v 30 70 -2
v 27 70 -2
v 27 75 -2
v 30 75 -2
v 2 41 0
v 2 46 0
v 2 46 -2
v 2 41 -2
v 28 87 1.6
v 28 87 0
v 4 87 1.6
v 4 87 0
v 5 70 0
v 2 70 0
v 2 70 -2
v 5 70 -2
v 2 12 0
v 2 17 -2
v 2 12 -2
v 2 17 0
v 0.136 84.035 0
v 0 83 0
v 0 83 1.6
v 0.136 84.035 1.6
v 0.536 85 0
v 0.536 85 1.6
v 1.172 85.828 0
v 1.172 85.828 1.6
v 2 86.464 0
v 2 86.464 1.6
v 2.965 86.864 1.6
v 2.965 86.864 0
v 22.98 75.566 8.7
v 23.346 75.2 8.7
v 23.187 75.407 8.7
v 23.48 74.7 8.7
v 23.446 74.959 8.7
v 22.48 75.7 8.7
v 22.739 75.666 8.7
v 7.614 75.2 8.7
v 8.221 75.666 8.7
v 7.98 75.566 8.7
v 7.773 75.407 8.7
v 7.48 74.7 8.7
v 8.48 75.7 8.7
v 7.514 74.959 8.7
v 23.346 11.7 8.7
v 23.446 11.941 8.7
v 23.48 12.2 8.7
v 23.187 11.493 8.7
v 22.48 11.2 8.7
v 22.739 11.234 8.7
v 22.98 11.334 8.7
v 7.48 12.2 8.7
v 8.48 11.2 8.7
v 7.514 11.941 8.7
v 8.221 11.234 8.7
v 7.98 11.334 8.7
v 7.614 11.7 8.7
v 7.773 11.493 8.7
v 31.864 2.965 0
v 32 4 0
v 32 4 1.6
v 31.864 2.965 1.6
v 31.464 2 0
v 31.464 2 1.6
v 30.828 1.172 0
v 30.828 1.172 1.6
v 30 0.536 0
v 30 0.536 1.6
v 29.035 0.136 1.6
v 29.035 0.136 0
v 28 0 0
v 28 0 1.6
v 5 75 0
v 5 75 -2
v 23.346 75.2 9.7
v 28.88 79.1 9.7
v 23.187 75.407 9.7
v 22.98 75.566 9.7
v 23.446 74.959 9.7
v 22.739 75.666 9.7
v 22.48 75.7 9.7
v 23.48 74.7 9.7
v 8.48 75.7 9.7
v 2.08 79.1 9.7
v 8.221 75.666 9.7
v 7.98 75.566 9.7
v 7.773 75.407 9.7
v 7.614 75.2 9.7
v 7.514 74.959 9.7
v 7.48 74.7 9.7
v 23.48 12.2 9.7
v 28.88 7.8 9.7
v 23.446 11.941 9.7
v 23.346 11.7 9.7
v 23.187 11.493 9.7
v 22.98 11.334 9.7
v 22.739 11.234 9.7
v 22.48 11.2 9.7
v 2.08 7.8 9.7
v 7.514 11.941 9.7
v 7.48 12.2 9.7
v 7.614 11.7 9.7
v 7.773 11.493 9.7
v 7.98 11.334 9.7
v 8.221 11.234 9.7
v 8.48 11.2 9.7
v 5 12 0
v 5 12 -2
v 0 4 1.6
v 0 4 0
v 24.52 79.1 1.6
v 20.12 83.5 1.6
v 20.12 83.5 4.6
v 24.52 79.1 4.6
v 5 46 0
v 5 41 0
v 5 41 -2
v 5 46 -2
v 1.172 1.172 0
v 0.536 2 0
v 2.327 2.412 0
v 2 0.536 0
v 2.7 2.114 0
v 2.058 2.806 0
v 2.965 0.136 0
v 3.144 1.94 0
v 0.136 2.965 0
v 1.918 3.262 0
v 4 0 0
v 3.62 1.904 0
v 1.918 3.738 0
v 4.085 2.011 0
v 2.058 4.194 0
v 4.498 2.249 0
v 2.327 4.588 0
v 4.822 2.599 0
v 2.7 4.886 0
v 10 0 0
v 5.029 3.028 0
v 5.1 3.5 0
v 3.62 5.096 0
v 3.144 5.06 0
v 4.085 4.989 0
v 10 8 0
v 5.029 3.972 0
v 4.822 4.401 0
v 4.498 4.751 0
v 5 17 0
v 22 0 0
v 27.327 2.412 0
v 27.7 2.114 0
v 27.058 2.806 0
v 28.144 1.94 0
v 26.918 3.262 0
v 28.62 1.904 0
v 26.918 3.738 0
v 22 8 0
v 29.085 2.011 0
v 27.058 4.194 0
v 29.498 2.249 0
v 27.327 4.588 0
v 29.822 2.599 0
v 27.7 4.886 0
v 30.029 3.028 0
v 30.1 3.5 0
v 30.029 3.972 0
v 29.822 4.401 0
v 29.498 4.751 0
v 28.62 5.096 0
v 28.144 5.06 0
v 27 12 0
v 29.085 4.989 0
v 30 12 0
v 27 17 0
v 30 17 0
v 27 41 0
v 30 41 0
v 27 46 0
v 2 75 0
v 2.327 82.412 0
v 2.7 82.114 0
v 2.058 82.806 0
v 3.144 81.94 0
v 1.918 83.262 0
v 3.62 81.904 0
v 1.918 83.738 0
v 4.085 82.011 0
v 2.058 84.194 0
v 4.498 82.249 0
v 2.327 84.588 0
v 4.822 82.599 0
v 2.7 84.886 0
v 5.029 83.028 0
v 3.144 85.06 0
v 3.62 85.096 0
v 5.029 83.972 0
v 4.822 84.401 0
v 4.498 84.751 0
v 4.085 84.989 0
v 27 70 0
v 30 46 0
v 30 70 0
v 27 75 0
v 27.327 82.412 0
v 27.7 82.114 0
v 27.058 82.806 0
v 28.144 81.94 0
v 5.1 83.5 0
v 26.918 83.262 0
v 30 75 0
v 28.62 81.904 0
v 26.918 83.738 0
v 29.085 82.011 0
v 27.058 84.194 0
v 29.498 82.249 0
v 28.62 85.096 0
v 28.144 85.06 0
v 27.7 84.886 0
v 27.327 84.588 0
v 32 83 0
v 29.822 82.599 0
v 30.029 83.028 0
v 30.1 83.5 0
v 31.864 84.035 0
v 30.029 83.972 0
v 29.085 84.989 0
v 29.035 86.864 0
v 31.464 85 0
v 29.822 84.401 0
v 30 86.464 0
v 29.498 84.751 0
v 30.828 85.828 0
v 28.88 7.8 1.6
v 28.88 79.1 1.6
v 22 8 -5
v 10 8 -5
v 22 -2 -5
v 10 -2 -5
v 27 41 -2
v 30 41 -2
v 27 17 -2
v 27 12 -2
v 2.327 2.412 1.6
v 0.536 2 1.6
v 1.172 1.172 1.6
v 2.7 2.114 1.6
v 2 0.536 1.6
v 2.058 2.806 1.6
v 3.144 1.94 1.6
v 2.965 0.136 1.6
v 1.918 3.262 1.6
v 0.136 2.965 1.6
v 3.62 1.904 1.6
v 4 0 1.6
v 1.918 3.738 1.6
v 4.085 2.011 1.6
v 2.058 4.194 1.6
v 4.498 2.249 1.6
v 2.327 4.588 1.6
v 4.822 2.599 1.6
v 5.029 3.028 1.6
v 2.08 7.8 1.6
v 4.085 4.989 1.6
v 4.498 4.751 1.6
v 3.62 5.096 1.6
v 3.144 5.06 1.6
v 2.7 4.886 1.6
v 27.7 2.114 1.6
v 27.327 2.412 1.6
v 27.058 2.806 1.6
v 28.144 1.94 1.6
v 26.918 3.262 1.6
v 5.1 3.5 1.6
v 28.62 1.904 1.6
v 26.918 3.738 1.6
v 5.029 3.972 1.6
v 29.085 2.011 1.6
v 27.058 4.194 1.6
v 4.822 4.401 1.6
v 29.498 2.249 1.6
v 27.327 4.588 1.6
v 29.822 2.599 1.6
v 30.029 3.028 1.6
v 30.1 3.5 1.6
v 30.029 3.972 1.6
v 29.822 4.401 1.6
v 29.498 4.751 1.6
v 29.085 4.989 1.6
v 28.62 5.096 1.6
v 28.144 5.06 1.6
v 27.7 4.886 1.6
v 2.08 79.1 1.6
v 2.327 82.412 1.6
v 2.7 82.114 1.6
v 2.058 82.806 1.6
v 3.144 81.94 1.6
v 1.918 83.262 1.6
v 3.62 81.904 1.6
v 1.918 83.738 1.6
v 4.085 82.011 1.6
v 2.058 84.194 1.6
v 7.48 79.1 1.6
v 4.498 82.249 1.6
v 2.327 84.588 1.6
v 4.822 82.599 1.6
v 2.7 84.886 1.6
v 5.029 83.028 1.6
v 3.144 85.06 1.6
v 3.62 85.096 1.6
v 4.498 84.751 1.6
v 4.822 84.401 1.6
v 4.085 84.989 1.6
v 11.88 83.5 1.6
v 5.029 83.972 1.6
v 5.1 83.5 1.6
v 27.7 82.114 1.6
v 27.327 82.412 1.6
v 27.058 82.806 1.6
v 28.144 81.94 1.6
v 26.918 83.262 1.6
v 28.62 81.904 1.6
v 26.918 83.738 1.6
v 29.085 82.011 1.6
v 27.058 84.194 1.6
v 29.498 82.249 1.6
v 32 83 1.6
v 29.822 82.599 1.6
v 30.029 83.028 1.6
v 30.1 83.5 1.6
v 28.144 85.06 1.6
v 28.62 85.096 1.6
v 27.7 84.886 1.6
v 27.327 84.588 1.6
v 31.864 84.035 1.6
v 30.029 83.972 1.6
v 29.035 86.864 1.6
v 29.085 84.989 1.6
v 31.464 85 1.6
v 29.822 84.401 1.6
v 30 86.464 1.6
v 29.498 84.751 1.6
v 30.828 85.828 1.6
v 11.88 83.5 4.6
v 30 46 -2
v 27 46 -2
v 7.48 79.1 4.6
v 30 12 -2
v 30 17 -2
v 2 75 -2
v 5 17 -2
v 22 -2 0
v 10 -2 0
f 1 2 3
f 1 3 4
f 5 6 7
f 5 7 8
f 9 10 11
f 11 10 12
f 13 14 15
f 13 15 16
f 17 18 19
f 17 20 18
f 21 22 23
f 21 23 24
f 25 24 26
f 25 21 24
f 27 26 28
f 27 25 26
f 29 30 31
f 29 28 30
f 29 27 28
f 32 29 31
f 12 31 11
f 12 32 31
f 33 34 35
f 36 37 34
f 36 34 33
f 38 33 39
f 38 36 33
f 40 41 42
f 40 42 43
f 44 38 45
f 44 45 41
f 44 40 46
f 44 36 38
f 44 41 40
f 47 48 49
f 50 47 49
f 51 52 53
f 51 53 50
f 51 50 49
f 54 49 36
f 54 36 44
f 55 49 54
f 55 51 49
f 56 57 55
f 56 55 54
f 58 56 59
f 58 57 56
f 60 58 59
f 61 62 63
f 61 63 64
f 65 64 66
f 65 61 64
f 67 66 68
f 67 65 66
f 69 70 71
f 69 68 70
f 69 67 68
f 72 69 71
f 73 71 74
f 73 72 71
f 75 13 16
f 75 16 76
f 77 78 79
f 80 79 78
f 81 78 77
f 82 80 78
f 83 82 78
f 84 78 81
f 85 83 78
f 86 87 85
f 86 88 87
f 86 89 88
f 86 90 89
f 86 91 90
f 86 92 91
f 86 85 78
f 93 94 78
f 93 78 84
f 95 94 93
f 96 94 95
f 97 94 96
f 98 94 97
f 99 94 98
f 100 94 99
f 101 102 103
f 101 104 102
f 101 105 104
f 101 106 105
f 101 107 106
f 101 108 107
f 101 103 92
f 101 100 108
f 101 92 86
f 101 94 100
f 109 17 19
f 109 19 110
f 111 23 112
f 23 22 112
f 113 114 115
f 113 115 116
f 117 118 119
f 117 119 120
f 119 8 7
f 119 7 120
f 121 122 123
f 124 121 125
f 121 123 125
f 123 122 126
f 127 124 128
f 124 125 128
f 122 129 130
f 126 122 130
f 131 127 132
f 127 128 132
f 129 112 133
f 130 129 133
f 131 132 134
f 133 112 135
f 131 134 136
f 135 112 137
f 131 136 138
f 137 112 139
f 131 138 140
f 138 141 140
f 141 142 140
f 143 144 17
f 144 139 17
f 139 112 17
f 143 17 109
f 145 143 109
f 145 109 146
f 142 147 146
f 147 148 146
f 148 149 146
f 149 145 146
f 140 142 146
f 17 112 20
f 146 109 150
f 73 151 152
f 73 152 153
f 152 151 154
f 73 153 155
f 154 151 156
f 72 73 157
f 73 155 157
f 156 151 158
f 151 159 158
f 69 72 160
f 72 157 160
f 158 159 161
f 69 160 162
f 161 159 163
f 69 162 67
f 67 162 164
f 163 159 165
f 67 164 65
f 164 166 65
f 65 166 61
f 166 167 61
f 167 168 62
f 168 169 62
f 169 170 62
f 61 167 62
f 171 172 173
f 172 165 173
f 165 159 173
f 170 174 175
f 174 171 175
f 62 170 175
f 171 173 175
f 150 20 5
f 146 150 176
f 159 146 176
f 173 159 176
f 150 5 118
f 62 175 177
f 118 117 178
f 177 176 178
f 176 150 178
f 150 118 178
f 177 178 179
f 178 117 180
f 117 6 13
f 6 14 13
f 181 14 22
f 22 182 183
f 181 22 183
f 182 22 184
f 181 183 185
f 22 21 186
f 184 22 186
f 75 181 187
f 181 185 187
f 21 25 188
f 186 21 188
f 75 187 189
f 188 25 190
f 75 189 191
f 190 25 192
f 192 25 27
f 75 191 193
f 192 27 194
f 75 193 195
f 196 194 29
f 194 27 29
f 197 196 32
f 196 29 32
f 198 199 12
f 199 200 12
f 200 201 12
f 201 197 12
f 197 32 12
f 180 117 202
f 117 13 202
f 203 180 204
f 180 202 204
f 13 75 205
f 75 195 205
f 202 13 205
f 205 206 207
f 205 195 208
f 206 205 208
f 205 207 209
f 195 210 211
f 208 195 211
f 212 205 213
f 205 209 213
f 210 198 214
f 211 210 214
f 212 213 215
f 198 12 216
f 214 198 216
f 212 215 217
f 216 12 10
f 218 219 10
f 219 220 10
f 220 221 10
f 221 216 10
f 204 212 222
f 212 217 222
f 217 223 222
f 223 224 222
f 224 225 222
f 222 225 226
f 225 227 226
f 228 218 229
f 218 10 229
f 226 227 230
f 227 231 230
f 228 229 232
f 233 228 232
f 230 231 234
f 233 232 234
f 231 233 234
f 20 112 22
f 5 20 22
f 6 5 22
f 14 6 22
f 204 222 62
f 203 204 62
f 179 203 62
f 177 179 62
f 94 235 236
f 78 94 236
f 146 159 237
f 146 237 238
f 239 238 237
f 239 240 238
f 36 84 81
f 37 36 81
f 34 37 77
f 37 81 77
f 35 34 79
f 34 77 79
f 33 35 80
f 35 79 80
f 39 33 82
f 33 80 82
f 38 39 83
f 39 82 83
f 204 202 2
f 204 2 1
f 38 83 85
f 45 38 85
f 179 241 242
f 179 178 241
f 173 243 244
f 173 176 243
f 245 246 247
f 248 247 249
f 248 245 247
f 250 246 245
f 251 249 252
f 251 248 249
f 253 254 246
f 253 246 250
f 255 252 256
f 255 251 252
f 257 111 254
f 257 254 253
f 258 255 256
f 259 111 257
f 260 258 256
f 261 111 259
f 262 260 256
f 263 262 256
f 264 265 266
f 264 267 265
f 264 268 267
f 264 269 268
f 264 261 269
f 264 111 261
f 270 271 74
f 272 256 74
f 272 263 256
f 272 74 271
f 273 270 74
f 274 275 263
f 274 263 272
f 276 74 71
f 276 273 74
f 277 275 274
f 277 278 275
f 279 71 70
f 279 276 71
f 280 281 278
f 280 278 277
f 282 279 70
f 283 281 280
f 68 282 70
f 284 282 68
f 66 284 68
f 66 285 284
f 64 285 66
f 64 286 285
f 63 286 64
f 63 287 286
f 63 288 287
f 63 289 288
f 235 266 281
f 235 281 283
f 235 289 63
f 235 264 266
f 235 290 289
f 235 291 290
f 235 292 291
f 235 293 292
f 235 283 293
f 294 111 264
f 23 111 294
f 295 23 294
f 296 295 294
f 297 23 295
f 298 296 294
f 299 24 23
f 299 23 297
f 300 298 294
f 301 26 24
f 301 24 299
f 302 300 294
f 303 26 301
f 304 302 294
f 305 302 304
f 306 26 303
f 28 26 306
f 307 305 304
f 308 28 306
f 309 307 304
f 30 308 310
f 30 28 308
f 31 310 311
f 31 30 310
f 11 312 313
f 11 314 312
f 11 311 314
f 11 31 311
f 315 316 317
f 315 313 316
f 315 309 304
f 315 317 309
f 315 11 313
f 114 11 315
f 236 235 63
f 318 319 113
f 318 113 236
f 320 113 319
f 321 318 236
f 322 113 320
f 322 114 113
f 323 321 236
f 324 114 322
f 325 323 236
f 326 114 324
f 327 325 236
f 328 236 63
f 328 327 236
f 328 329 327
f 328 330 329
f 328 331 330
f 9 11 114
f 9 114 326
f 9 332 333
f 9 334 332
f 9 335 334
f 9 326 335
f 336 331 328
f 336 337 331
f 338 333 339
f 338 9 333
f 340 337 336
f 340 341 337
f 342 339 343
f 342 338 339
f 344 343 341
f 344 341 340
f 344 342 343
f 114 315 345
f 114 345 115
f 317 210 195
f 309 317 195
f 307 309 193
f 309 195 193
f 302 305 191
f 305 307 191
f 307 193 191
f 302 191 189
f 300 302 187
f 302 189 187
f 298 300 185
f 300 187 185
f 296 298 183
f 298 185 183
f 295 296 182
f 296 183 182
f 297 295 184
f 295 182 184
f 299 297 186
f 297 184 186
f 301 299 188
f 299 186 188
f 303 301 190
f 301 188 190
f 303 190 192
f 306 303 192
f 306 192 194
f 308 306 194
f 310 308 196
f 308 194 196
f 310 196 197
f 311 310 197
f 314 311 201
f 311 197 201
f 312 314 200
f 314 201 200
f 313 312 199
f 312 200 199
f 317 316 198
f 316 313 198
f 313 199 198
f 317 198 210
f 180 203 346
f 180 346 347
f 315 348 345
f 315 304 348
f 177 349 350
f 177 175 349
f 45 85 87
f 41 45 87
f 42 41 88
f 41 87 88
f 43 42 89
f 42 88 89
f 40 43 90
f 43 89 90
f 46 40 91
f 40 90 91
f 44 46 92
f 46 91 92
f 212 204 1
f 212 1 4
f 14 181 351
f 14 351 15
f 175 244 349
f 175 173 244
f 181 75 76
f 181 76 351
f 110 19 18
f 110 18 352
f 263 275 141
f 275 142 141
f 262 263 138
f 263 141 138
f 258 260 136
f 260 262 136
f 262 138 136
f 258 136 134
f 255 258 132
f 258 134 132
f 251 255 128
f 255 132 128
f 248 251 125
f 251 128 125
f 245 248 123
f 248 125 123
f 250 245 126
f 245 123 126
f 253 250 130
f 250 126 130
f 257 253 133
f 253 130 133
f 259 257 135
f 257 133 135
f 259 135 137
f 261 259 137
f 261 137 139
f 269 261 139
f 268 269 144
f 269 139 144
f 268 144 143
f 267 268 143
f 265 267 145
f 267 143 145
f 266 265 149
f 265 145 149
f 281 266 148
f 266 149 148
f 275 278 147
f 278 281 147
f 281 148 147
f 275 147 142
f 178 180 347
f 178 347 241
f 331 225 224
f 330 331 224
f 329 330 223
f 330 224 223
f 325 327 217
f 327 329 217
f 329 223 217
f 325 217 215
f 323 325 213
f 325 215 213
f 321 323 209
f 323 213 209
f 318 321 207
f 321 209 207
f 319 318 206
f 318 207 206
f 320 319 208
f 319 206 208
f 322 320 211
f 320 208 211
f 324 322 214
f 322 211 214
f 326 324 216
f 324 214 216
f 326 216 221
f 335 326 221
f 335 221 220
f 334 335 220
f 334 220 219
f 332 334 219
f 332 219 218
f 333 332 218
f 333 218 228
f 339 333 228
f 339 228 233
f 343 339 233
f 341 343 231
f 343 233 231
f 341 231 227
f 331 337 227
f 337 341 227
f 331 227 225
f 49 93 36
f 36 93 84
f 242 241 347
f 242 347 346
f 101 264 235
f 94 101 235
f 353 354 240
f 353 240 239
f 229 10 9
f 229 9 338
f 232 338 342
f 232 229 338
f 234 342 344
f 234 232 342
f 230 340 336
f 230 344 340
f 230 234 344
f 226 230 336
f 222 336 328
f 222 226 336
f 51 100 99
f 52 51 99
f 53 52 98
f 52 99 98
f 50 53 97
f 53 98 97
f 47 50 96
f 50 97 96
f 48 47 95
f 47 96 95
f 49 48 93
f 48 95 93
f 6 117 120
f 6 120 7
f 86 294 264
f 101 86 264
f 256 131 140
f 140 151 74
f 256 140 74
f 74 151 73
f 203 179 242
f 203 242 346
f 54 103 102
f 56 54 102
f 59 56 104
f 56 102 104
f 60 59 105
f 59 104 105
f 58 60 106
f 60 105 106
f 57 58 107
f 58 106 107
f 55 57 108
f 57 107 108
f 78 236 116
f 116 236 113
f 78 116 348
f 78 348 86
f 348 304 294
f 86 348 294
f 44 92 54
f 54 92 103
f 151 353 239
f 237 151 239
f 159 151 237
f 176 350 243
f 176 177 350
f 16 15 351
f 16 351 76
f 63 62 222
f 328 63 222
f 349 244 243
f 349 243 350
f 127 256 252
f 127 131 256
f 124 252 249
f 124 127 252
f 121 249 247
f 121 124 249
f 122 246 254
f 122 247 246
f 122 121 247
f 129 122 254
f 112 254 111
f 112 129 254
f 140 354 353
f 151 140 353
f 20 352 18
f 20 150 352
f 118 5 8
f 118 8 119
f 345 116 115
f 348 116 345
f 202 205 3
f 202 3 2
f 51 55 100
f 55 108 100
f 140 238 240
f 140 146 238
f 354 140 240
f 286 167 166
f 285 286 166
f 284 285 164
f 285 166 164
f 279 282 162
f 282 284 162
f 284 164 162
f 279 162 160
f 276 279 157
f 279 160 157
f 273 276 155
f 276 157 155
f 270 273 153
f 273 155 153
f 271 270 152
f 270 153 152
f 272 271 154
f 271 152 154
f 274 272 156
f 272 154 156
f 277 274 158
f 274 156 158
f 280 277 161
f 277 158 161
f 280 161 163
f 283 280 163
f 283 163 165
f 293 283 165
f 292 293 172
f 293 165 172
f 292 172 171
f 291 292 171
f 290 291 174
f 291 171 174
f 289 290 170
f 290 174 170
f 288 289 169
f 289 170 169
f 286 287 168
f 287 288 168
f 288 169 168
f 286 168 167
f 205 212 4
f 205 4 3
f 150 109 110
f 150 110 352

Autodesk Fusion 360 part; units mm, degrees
sketch "Skizze1" plane through (0, 0, 0) normal (0, 0, 1) x (1, 0, 0)
  line L0 (4, 0) -> (28, 0)
  line L1 (32, 4) -> (32, 83)
  line L2 (28, 87) -> (4, 87)
  line L3 (0, 83) -> (0, 4)
  circle A0 centre (3.5, 3.5) radius 1.6
  circle A1 centre (28.5, 3.5) radius 1.6
  circle A2 centre (3.5, 83.5) radius 1.6
  circle A3 centre (28.5, 83.5) radius 1.6
  arc A4 (4, 87) -> (0, 83) centre (4, 83) ccw
  arc A5 (32, 83) -> (28, 87) centre (28, 83) ccw
  arc A6 (0, 4) -> (4, 0) centre (4, 4) ccw
  arc A7 (28, 0) -> (32, 4) centre (28, 4) ccw
  point P0 (32, 0)
  point P1 (0, 87)
  dimension "d1" = 32
  dimension "d2" = 87
  dimension "d3" = 3.2
  dimension "d4" = 3.5
  dimension "d5" = 3.5
  dimension "d8" = 25
  dimension "d9" = 80
  dimension "d10" = 4
extrude "Extrusion1" add sketch "Skizze1" along normal blind 1.6
sketch "Skizze2" plane through (0, 0, 1.6) normal (0, 0, 1) x (-1, 0, 0)
  circle A0 centre (-28.5, -3.5) radius 1.6
  circle A1 centre (-3.5, -3.5) radius 1.6
  circle A2 centre (-3.5, -83.5) radius 1.6
  circle A3 centre (-28.5, -83.5) radius 1.6
  arc A4 (-28, 0) -> (-32, -4) centre (-28, -4) ccw
  line L0 (-32, -4) -> (-32, -83)
  arc A5 (-32, -83) -> (-28, -87) centre (-28, -83) ccw
  line L1 (-28, -87) -> (-4, -87)
  arc A6 (-4, -87) -> (0, -83) centre (-4, -83) ccw
  line L2 (0, -83) -> (0, -4)
  arc A7 (0, -4) -> (-4, 0) centre (-4, -4) ccw
  line L3 (-4, 0) -> (-28, 0)
  line L4 (-2.08, -7.8) -> (-28.88, -7.8)
  line L5 (-28.88, -7.8) -> (-28.88, -79.1)
  line L6 (-28.88, -79.1) -> (-2.08, -79.1)
  line L7 (-2.08, -79.1) -> (-2.08, -7.8)
  dimension "d13" = 26.8
  dimension "d14" = 71.3
  dimension "d15" = 7.8
  dimension "d16" = 2.08
extrude "Extrusion2" add sketch "Skizze2" along normal blind 8.1 contours L4 L5 L6 L7
sketch "Skizze3" plane through (0, 0, 9.7) normal (0, 0, 1) x (-1, 0, 0)
  line L0 (-2.08, -79.1) -> (-2.08, -7.8)
  line L1 (-2.08, -7.8) -> (-28.88, -7.8)
  line L2 (-28.88, -7.8) -> (-28.88, -79.1)
  line L3 (-28.88, -79.1) -> (-2.08, -79.1)
  line L4 (-8.48, -11.2) -> (-22.48, -11.2)
  line L5 (-23.48, -12.2) -> (-23.48, -74.7)
  line L6 (-22.48, -75.7) -> (-8.48, -75.7)
  line L7 (-7.48, -74.7) -> (-7.48, -12.2)
  arc A0 (-7.48, -12.2) -> (-8.48, -11.2) centre (-8.48, -12.2) ccw
  arc A1 (-22.48, -11.2) -> (-23.48, -12.2) centre (-22.48, -12.2) ccw
  arc A2 (-8.48, -75.7) -> (-7.48, -74.7) centre (-8.48, -74.7) ccw
  arc A3 (-23.48, -74.7) -> (-22.48, -75.7) centre (-22.48, -74.7) ccw
  point P0 (-7.48, -11.2)
  point P1 (-23.48, -11.2)
  point P2 (-7.48, -75.7)
  dimension "d19" = 16
  dimension "d20" = 64.5
  dimension "d21" = 3.4
  dimension "d22" = 5.4
  dimension "d23" = 1
extrude "Extrusion3" cut sketch "Skizze3" against normal blind 1 contours L4 L5 L6 L7 A0 A1 A2 A3
sketch "Skizze4" plane through (0, 0, 1.6) normal (0, 0, 1) x (-1, 0, 0)
  line L0 (-2.08, -79.1) -> (-28.88, -79.1)
  line L1 (-28.88, -79.1) -> (-28.88, -7.8)
  line L2 (-28.88, -7.8) -> (-2.08, -7.8)
  line L3 (-2.08, -7.8) -> (-2.08, -79.1)
  circle A0 centre (-28.5, -3.5) radius 1.6
  circle A1 centre (-3.5, -3.5) radius 1.6
  circle A2 centre (-3.5, -83.5) radius 1.6
  circle A3 centre (-28.5, -83.5) radius 1.6
  arc A4 (-28, 0) -> (-32, -4) centre (-28, -4) ccw
  line L4 (-32, -4) -> (-32, -83)
  arc A5 (-32, -83) -> (-28, -87) centre (-28, -83) ccw
  line L5 (-28, -87) -> (-4, -87)
  arc A6 (-4, -87) -> (0, -83) centre (-4, -83) ccw
  line L6 (0, -83) -> (0, -4)
  arc A7 (0, -4) -> (-4, 0) centre (-4, -4) ccw
  line L7 (-4, 0) -> (-28, 0)
  line L8 (-7.48, -79.1) -> (-11.88, -83.5)
  line L9 (-11.88, -83.5) -> (-20.12, -83.5)
  line L10 (-20.12, -83.5) -> (-24.52, -79.1)
  dimension "d26" = 7.48
  dimension "d27" = 7.48
  dimension "d28" = 3.5
  dimension "d29" = 45
  dimension "d30" = 45
extrude "Extrusion4" add sketch "Skizze4" along normal blind 3 contours L0 L8 L9 L10
sketch "Skizze5" plane through (0, 0, 0) normal (0, 0, -1) x (1, 0, 0)
  circle A0 centre (28.5, -3.5) radius 1.6
  circle A1 centre (3.5, -3.5) radius 1.6
  circle A2 centre (3.5, -83.5) radius 1.6
  circle A3 centre (28.5, -83.5) radius 1.6
  arc A4 (32, -4) -> (28, 0) centre (28, -4) ccw
  line L0 (28, 0) -> (4, 0)
  arc A5 (4, 0) -> (0, -4) centre (4, -4) ccw
  line L1 (0, -4) -> (0, -83)
  arc A6 (0, -83) -> (4, -87) centre (4, -83) ccw
  line L2 (4, -87) -> (28, -87)
  arc A7 (28, -87) -> (32, -83) centre (28, -83) ccw
  line L3 (32, -83) -> (32, -4)
  line L4 (2, -12) -> (5, -12)
  line L5 (5, -12) -> (5, -17)
  line L6 (5, -17) -> (2, -17)
  line L7 (2, -17) -> (2, -12)
  line L8 (30, -12) -> (30, -17)
  line L9 (30, -17) -> (27, -17)
  line L10 (27, -12) -> (30, -12)
  line L11 (27, -17) -> (27, -12)
  line L12 (5, -41) -> (5, -46)
  line L13 (5, -46) -> (2, -46)
  line L14 (2, -41) -> (5, -41)
  line L15 (2, -46) -> (2, -41)
  line L16 (30, -41) -> (30, -46)
  line L17 (30, -46) -> (27, -46)
  line L18 (27, -41) -> (30, -41)
  line L19 (27, -46) -> (27, -41)
  line L20 (5, -70) -> (5, -75)
  line L21 (5, -75) -> (2, -75)
  line L22 (2, -70) -> (5, -70)
  line L23 (2, -75) -> (2, -70)
  line L24 (30, -70) -> (30, -75)
  line L25 (30, -75) -> (27, -75)
  line L26 (27, -70) -> (30, -70)
  line L27 (27, -75) -> (27, -70)
  dimension "d33" = 3
  dimension "d34" = 5
  dimension "d35" = 12
  dimension "d36" = 2
  dimension "d39" = 25
  dimension "d40" = -58
extrude "Extrusion5" add sketch "Skizze5" along normal blind 2 contours L4 L5 L6 L7 | L8 L9 L10 L11 | L12 L13 L14 L15 | L16 L17 L18 L19 | L20 L21 L22 L23 | L24 L25 L26 L27
sketch "Skizze6" plane through (0, 0, 0) normal (0, 0, -1) x (1, 0, 0)
  line L0 (2, -17) -> (2, -12)
  line L1 (2, -12) -> (5, -12)
  line L2 (5, -12) -> (5, -17)
  line L3 (5, -17) -> (2, -17)
  line L4 (2, -75) -> (2, -70)
  line L5 (2, -70) -> (5, -70)
  line L6 (5, -70) -> (5, -75)
  line L7 (5, -75) -> (2, -75)
  line L8 (2, -46) -> (2, -41)
  line L9 (2, -41) -> (5, -41)
  line L10 (5, -41) -> (5, -46)
  line L11 (5, -46) -> (2, -46)
  line L12 (27, -17) -> (27, -12)
  line L13 (27, -12) -> (30, -12)
  line L14 (30, -12) -> (30, -17)
  line L15 (30, -17) -> (27, -17)
  line L16 (27, -75) -> (27, -70)
  line L17 (27, -70) -> (30, -70)
  line L18 (30, -70) -> (30, -75)
  line L19 (30, -75) -> (27, -75)
  line L20 (27, -46) -> (27, -41)
  line L21 (27, -41) -> (30, -41)
  line L22 (30, -41) -> (30, -46)
  line L23 (30, -46) -> (27, -46)
  circle A0 centre (28.5, -3.5) radius 1.6
  circle A1 centre (3.5, -3.5) radius 1.6
  circle A2 centre (3.5, -83.5) radius 1.6
  circle A3 centre (28.5, -83.5) radius 1.6
  arc A4 (32, -4) -> (28, 0) centre (28, -4) ccw
  line L24 (28, 0) -> (4, 0)
  arc A5 (4, 0) -> (0, -4) centre (4, -4) ccw
  line L25 (0, -4) -> (0, -83)
  arc A6 (0, -83) -> (4, -87) centre (4, -83) ccw
  line L26 (4, -87) -> (28, -87)
  arc A7 (28, -87) -> (32, -83) centre (28, -83) ccw
  line L27 (32, -83) -> (32, -4)
  line L28 (10, 2) -> (22, 2)
  line L29 (22, 2) -> (22, -8)
  line L30 (22, -8) -> (10, -8)
  line L31 (10, -8) -> (10, 2)
  dimension "d43" = 12
  dimension "d44" = 10
  dimension "d45" = 2
  dimension "d46" = 10
extrude "Extrusion6" add sketch "Skizze6" along normal blind 5 contours L24 L29 L30 L31 | L24 L28 L29 L31
